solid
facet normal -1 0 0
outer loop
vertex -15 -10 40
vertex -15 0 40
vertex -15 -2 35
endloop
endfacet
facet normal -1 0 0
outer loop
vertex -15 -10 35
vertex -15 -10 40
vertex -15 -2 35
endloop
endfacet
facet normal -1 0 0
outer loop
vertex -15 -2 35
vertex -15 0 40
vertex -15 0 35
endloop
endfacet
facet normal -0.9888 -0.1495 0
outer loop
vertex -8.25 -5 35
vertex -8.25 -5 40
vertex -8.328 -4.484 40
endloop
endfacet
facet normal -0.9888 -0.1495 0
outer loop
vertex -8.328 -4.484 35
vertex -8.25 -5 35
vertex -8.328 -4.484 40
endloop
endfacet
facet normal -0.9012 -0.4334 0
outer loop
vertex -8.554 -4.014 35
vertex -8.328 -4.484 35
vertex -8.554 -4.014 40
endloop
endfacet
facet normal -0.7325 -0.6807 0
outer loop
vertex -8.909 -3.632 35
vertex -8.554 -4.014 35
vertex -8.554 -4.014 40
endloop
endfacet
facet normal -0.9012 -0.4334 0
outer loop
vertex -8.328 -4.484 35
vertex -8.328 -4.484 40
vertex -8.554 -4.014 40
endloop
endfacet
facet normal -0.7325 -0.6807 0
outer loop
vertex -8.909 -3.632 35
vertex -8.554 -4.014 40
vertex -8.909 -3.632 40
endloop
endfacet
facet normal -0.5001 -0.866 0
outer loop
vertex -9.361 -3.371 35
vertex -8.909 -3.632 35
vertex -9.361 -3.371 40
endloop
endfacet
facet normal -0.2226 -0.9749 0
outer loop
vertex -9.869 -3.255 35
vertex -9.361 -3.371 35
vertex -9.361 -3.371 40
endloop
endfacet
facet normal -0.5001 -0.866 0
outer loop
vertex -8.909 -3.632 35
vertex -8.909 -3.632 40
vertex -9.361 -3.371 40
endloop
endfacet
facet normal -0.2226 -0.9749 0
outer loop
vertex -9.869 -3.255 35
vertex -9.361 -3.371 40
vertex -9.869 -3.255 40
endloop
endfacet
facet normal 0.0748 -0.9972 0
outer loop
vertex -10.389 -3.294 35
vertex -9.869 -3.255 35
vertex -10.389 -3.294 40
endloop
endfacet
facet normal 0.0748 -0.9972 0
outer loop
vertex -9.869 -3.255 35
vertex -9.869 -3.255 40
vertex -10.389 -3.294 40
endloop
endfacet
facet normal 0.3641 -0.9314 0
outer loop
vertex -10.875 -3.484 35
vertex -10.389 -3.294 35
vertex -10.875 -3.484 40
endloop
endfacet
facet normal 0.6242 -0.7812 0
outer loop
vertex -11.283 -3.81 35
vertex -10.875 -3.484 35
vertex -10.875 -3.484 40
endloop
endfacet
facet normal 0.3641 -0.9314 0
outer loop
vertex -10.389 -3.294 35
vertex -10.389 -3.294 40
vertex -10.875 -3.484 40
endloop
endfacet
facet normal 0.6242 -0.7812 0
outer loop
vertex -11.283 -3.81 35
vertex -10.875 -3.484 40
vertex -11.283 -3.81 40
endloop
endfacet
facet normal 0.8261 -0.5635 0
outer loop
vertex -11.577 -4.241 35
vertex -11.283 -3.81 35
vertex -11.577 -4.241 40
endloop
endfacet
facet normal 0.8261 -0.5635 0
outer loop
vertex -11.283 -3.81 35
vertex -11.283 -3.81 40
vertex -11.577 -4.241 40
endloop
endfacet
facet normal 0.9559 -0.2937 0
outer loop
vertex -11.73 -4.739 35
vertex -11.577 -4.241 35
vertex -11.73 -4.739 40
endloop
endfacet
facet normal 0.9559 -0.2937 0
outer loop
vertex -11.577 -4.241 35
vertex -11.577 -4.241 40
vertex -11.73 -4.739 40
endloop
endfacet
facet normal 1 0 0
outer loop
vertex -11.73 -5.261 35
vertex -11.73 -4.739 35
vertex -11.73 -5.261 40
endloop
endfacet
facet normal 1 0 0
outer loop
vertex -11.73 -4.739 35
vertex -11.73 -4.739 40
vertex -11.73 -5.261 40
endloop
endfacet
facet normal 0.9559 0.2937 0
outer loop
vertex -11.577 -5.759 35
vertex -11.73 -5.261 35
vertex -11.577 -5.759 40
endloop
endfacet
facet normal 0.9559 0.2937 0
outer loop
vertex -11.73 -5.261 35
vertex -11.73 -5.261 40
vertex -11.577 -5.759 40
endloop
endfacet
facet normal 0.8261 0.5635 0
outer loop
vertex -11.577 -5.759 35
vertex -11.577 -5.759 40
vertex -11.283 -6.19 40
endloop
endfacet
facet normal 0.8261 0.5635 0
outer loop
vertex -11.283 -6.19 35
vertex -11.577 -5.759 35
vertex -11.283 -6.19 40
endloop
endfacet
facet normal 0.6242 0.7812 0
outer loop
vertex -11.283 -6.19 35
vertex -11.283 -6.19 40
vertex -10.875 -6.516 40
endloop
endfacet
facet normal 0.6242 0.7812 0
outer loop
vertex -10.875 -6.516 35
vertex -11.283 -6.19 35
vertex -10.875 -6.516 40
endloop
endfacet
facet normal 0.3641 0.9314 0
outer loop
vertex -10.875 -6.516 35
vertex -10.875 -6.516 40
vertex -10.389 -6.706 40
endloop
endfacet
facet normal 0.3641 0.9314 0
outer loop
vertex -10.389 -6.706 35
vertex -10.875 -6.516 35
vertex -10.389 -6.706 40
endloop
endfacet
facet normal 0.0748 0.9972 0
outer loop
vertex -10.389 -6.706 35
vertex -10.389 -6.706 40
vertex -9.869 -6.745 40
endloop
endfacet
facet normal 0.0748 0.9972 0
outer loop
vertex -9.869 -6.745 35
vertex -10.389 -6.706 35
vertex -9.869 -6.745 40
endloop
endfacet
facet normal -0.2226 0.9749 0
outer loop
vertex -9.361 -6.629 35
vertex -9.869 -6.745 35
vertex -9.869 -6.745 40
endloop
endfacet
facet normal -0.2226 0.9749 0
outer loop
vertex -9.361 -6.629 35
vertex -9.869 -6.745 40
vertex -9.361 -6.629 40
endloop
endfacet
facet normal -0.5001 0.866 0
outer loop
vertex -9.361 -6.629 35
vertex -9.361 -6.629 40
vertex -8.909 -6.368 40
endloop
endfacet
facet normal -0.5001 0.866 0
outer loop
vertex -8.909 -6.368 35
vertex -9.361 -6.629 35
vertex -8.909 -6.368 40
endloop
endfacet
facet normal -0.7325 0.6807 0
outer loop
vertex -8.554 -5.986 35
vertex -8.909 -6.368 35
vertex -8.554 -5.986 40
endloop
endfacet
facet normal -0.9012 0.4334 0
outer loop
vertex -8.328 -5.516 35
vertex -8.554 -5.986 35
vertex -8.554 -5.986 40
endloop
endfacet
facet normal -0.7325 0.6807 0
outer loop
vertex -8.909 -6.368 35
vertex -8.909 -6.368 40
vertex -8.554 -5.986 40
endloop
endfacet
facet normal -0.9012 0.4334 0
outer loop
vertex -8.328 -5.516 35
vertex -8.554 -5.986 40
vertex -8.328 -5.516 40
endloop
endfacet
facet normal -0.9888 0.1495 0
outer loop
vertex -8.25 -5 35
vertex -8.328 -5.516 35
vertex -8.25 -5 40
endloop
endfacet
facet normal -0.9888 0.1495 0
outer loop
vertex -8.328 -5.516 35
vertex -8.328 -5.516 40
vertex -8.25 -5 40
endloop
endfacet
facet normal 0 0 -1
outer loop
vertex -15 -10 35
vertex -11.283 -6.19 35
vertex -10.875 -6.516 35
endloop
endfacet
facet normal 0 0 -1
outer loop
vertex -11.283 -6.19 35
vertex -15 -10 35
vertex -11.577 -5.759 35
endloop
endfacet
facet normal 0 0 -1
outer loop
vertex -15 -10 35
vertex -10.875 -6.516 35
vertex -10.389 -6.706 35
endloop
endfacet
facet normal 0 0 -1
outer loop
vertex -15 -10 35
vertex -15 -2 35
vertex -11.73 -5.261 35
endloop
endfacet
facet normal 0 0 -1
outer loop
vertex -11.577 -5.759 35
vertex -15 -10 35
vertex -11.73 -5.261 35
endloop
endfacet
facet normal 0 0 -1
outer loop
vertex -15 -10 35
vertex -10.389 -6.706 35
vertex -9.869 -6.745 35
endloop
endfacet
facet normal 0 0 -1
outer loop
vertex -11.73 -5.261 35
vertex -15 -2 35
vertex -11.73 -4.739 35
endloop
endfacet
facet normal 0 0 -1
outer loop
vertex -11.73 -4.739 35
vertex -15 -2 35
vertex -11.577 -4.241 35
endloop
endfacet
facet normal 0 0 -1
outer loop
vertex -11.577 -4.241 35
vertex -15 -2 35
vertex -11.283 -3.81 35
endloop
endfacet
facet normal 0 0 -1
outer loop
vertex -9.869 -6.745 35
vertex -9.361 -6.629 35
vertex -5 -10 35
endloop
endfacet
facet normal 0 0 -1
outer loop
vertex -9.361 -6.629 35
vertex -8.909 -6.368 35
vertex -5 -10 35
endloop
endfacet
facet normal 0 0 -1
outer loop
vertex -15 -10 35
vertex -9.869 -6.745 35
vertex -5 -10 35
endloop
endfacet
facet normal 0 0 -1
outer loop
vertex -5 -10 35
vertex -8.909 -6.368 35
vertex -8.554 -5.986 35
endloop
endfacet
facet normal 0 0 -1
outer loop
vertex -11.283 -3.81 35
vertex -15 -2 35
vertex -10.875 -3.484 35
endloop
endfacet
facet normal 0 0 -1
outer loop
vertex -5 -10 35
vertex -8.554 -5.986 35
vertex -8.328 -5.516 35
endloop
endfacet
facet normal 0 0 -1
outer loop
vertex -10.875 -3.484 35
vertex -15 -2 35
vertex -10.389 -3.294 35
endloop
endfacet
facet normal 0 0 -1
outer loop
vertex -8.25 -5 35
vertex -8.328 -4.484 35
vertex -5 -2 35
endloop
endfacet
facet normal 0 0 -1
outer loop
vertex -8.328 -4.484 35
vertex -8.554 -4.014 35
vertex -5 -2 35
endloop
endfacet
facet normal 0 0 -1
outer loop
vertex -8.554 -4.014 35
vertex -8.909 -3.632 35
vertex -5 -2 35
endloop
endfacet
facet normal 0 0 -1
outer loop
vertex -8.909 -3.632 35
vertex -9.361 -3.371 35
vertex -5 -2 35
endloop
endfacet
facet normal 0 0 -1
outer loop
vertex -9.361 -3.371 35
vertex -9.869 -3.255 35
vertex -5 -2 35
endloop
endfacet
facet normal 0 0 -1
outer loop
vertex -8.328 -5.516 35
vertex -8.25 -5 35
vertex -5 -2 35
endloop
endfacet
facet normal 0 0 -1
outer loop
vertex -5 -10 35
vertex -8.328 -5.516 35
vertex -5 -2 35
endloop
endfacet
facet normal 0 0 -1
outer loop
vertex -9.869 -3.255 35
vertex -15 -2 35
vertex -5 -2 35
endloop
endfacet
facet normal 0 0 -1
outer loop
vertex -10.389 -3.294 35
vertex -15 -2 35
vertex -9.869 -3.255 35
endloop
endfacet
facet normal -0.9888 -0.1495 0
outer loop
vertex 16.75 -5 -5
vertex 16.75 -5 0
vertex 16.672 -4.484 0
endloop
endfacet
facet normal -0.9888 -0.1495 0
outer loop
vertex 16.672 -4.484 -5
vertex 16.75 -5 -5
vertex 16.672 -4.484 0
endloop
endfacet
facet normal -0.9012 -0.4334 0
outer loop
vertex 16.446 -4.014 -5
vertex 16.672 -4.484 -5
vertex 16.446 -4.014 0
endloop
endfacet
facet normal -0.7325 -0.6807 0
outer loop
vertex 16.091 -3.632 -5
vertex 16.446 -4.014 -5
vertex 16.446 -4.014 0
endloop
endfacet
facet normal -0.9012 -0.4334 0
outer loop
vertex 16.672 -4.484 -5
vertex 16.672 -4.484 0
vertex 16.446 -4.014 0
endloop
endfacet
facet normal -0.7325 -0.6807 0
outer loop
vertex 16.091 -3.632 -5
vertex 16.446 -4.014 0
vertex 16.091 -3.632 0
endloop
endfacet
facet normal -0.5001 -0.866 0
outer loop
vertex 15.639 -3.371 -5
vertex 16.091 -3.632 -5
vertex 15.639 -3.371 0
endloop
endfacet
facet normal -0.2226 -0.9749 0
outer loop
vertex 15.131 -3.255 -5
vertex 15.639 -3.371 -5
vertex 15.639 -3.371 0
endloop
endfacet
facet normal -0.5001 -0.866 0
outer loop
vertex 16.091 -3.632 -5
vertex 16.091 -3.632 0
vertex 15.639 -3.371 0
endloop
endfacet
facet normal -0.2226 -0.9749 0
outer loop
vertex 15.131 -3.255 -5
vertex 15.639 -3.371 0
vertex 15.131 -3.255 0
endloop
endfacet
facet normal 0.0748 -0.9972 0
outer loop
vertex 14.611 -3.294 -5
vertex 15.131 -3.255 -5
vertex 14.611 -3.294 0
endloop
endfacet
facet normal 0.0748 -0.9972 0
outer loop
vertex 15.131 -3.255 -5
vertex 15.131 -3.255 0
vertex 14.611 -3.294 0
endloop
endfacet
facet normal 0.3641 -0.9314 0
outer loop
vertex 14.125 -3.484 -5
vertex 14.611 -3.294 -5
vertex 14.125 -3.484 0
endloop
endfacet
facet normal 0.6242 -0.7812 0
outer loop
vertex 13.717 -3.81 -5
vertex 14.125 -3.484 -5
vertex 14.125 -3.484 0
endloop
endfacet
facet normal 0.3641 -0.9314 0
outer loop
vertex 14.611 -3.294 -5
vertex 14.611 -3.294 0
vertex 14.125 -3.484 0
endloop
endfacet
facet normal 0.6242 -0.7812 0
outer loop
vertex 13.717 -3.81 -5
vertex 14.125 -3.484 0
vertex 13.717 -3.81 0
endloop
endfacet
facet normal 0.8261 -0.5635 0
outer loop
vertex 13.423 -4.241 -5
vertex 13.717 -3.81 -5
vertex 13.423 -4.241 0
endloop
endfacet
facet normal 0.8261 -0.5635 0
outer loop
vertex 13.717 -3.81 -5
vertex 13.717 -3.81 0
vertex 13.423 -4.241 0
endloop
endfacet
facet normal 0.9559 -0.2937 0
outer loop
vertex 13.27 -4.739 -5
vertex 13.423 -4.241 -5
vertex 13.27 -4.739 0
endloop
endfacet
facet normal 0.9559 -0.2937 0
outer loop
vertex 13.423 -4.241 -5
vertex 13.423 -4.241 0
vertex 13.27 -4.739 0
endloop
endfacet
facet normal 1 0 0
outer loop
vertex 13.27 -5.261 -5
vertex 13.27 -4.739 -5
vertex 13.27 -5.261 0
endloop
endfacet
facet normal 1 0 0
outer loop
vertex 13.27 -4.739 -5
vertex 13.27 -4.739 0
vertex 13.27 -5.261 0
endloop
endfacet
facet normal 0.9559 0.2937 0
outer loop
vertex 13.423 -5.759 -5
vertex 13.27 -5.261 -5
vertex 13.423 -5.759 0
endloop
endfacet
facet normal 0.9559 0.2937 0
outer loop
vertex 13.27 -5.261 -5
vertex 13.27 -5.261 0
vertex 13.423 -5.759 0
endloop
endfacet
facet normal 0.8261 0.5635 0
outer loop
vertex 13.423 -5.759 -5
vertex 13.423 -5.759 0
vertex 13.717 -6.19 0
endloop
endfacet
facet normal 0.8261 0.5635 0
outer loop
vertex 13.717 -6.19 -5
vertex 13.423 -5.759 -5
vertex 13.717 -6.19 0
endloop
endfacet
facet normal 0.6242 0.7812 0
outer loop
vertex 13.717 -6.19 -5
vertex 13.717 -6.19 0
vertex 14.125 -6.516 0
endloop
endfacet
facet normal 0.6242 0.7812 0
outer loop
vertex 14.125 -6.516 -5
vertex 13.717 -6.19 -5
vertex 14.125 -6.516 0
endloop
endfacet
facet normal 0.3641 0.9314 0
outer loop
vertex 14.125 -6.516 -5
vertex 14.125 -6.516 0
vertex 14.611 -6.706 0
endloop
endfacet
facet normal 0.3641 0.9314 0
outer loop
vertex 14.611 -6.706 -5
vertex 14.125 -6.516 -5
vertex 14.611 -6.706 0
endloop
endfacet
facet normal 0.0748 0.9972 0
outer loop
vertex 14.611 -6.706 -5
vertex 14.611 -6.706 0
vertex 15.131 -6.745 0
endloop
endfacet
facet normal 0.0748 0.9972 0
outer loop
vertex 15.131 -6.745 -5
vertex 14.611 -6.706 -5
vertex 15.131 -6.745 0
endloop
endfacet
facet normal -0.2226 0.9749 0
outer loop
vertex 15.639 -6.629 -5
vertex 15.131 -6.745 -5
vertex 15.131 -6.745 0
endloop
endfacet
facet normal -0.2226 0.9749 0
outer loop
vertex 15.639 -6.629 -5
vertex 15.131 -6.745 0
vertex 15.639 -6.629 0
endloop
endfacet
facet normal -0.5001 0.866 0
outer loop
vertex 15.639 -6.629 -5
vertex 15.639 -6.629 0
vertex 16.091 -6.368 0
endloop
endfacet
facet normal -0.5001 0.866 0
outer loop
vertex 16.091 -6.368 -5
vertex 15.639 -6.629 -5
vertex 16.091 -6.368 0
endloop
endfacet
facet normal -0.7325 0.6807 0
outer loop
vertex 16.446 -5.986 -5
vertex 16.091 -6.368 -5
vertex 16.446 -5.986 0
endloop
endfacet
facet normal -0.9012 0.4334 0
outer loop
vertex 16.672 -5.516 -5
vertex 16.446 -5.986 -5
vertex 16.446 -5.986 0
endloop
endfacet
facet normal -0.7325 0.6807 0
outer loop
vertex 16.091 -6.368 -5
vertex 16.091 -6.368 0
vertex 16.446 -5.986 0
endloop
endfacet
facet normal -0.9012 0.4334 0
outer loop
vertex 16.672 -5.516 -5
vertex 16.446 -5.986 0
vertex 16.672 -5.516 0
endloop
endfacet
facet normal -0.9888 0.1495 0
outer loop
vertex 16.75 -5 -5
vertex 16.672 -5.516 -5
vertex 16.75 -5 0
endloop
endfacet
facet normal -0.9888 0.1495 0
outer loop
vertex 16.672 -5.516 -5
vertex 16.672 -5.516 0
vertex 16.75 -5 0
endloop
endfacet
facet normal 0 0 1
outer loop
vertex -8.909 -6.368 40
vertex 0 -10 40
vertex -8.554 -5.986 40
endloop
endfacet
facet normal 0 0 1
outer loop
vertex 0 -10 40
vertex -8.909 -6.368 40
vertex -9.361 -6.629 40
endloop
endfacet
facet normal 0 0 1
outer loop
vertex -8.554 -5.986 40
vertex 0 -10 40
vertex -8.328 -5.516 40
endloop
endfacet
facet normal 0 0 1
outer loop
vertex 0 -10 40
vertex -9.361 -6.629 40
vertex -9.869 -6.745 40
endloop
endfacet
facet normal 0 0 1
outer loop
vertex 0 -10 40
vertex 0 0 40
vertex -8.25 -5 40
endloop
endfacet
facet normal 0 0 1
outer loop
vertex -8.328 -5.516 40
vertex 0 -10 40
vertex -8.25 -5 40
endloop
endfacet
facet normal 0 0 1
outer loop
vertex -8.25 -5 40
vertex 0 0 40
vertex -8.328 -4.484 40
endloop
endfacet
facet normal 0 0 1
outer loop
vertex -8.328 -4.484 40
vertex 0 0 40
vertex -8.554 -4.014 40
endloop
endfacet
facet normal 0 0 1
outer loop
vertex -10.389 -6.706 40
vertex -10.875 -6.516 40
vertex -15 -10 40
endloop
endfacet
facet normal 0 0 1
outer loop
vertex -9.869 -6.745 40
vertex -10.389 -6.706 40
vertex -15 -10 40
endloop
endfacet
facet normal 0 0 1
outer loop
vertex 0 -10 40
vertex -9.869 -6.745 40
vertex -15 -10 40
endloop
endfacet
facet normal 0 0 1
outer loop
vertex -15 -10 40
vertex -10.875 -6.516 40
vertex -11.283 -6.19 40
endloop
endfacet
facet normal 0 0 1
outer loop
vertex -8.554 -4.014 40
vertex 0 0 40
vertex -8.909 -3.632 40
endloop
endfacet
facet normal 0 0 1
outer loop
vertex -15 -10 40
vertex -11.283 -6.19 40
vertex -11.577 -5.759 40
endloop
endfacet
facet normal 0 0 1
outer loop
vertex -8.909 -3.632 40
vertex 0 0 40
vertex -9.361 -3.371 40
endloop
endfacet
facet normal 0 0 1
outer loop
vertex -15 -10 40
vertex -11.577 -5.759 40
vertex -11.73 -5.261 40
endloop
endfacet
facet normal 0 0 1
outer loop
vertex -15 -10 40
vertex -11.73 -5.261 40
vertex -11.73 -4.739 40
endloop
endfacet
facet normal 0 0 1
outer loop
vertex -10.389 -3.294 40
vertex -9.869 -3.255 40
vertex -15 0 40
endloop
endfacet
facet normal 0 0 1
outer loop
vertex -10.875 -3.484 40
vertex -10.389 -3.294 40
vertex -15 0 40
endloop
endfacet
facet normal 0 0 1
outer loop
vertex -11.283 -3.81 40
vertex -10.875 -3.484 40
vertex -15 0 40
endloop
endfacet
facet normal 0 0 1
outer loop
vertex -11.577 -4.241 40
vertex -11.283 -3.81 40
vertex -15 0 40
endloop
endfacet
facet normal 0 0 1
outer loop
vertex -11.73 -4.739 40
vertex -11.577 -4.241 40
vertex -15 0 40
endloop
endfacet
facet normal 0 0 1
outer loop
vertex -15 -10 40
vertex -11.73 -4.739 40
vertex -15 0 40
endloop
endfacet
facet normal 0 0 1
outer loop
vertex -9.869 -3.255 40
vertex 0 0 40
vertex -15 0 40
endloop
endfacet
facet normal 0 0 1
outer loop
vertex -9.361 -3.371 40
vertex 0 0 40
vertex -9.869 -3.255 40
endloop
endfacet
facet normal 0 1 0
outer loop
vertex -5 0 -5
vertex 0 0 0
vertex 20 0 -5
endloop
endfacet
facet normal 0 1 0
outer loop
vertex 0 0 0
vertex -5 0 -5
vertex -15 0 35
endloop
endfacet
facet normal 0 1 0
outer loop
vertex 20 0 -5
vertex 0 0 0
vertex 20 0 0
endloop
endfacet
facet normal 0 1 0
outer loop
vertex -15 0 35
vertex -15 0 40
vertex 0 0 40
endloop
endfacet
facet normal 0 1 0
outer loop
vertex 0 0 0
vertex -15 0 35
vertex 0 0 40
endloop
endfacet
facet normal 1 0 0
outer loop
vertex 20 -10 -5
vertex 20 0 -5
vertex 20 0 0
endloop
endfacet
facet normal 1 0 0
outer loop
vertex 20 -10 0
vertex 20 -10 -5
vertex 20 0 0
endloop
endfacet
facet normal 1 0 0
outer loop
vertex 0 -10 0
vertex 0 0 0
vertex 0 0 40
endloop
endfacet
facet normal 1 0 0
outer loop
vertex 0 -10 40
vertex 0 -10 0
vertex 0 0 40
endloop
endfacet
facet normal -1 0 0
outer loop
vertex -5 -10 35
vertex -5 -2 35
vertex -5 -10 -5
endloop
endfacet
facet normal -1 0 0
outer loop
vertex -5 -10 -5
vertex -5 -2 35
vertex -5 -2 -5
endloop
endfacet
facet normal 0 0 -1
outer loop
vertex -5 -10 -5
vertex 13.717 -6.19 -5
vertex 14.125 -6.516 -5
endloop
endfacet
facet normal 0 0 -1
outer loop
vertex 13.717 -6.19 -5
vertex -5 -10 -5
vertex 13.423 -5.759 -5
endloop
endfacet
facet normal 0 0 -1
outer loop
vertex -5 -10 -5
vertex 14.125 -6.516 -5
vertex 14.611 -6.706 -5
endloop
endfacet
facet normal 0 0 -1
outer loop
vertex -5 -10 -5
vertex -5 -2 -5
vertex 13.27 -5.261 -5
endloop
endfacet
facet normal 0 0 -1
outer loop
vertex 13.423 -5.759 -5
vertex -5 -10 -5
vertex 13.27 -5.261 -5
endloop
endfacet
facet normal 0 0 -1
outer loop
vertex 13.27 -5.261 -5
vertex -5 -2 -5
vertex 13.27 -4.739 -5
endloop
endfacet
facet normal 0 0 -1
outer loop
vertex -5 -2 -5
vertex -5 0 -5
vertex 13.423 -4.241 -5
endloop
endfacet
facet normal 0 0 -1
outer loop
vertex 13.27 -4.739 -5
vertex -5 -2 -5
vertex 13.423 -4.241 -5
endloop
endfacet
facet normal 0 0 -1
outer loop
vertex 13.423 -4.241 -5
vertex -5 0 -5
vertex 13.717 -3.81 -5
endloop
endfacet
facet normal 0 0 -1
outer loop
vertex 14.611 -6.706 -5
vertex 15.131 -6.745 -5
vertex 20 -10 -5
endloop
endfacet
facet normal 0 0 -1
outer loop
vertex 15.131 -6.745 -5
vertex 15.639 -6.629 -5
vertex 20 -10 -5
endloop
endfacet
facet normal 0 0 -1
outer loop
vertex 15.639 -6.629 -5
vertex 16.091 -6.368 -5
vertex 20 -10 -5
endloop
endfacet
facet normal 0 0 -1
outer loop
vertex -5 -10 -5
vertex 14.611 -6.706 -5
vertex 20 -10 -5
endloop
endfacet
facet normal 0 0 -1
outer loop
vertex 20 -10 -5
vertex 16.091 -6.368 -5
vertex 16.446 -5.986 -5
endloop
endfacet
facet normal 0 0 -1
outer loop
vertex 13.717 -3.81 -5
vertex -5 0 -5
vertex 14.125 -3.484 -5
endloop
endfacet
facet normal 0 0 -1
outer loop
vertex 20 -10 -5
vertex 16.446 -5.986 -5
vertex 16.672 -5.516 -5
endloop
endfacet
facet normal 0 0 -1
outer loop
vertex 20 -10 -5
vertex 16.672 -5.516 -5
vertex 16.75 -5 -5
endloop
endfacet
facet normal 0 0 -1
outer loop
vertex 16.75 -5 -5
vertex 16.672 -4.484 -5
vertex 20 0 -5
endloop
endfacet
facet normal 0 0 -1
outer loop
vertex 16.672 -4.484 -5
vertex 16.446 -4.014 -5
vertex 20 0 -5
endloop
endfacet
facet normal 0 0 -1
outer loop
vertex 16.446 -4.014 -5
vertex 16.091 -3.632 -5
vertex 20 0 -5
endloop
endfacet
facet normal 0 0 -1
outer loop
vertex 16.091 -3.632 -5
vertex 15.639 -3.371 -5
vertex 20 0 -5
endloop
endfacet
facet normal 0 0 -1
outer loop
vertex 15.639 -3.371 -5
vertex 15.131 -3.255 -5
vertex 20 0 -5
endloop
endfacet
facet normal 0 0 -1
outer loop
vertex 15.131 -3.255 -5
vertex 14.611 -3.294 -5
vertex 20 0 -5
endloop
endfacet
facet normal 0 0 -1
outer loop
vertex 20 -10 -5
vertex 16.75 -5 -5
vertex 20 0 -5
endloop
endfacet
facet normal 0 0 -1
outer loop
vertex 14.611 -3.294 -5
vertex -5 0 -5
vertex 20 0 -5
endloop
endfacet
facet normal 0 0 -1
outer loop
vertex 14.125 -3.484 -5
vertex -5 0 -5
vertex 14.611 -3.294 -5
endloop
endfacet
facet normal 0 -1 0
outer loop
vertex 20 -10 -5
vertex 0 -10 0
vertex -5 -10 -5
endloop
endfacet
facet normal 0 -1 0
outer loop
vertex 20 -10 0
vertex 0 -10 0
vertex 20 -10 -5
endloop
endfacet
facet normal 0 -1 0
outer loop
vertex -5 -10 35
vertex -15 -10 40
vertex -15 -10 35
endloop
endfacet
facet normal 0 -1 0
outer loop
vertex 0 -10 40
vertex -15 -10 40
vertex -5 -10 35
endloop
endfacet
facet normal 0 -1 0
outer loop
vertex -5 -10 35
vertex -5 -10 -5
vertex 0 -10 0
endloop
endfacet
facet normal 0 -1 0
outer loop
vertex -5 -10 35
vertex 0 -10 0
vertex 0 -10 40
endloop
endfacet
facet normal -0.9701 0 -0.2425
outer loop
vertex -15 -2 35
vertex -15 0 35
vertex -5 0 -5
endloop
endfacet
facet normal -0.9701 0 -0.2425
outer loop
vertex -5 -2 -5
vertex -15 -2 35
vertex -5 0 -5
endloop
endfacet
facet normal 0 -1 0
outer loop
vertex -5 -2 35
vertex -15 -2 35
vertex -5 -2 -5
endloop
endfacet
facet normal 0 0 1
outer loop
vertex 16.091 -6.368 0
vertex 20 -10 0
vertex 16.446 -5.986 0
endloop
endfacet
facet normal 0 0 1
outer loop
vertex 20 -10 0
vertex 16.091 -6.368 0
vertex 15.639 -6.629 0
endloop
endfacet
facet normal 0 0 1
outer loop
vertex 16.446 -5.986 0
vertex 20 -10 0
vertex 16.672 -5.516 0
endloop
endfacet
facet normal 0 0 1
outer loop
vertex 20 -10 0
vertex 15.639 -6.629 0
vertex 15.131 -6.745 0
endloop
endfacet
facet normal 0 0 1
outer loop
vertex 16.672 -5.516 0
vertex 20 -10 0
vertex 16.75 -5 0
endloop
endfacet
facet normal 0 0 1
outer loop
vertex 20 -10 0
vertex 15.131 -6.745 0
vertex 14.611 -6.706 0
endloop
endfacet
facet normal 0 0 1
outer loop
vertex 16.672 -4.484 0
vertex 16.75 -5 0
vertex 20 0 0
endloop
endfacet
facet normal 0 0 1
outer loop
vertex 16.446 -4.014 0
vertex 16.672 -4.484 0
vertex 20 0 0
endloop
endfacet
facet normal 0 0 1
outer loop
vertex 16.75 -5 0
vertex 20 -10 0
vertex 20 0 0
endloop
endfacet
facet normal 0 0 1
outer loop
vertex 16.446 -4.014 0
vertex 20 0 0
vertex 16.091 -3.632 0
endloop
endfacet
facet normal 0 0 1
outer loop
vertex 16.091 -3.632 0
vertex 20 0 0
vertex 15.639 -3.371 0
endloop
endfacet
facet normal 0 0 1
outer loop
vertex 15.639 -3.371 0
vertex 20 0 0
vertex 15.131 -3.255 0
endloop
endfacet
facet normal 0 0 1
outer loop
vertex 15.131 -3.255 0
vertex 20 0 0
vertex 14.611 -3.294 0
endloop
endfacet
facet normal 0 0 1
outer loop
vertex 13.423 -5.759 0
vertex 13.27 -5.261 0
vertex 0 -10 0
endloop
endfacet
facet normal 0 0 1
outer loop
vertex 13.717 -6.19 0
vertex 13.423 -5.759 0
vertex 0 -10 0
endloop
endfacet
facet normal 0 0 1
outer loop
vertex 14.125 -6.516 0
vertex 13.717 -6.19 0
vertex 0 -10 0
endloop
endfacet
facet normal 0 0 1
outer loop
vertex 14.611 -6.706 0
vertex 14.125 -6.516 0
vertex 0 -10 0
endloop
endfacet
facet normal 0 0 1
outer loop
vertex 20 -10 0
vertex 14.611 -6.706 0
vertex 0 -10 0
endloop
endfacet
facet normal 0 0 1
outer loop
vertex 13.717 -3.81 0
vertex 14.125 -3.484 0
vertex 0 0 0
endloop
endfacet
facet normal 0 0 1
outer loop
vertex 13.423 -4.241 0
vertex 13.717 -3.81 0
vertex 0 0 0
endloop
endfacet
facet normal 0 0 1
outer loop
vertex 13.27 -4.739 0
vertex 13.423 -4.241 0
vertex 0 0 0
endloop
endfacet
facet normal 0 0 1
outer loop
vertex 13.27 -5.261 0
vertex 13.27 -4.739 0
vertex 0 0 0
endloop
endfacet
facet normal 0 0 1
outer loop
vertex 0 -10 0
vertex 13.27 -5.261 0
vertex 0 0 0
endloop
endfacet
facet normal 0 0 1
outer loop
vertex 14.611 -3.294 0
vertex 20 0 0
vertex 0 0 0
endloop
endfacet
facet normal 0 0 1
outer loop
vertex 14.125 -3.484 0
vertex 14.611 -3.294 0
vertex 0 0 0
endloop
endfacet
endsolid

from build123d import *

# Parameters (mm, degrees)
F1_DEPTH = 10
F2_DEPTH = 2
F3_R     = 1.75
F4_DEPTH = 5
F5_R     = 1.75
F6_DEPTH = 5


with BuildPart() as f1:
    # F0 (on Front) → F1 (new body)
    with BuildSketch(Plane.XZ):
        Polygon((0, 40), (-15, 40), (-15, 35), (-5, 35), (-5, -5), (20, -5), (20, 0), (0, 0), align=None)
    extrude(amount=F1_DEPTH)

    # F0 (on Front) → F2 (join)
    with BuildSketch(Plane.XZ):
        Polygon((0, 40), (-15, 40), (-15, 35), (-5, 35), (-5, -5), (20, -5), (20, 0), (0, 0), align=None)
        Polygon((-5, 35), (-15, 35), (-5, -5), align=None)
    extrude(amount=F2_DEPTH)

    # F3 (on face) → F4 (cut)
    with BuildSketch(Plane.XY.offset(40)):
        with Locations((-10, -5)):
            Circle(F3_R)
    extrude(amount=-F4_DEPTH, mode=Mode.SUBTRACT)

    # F5 (on face) → F6 (cut)
    with BuildSketch(Plane.XY):
        with Locations((15, -5)):
            Circle(F5_R)
    extrude(amount=-F6_DEPTH, mode=Mode.SUBTRACT)


solid = f1.part
